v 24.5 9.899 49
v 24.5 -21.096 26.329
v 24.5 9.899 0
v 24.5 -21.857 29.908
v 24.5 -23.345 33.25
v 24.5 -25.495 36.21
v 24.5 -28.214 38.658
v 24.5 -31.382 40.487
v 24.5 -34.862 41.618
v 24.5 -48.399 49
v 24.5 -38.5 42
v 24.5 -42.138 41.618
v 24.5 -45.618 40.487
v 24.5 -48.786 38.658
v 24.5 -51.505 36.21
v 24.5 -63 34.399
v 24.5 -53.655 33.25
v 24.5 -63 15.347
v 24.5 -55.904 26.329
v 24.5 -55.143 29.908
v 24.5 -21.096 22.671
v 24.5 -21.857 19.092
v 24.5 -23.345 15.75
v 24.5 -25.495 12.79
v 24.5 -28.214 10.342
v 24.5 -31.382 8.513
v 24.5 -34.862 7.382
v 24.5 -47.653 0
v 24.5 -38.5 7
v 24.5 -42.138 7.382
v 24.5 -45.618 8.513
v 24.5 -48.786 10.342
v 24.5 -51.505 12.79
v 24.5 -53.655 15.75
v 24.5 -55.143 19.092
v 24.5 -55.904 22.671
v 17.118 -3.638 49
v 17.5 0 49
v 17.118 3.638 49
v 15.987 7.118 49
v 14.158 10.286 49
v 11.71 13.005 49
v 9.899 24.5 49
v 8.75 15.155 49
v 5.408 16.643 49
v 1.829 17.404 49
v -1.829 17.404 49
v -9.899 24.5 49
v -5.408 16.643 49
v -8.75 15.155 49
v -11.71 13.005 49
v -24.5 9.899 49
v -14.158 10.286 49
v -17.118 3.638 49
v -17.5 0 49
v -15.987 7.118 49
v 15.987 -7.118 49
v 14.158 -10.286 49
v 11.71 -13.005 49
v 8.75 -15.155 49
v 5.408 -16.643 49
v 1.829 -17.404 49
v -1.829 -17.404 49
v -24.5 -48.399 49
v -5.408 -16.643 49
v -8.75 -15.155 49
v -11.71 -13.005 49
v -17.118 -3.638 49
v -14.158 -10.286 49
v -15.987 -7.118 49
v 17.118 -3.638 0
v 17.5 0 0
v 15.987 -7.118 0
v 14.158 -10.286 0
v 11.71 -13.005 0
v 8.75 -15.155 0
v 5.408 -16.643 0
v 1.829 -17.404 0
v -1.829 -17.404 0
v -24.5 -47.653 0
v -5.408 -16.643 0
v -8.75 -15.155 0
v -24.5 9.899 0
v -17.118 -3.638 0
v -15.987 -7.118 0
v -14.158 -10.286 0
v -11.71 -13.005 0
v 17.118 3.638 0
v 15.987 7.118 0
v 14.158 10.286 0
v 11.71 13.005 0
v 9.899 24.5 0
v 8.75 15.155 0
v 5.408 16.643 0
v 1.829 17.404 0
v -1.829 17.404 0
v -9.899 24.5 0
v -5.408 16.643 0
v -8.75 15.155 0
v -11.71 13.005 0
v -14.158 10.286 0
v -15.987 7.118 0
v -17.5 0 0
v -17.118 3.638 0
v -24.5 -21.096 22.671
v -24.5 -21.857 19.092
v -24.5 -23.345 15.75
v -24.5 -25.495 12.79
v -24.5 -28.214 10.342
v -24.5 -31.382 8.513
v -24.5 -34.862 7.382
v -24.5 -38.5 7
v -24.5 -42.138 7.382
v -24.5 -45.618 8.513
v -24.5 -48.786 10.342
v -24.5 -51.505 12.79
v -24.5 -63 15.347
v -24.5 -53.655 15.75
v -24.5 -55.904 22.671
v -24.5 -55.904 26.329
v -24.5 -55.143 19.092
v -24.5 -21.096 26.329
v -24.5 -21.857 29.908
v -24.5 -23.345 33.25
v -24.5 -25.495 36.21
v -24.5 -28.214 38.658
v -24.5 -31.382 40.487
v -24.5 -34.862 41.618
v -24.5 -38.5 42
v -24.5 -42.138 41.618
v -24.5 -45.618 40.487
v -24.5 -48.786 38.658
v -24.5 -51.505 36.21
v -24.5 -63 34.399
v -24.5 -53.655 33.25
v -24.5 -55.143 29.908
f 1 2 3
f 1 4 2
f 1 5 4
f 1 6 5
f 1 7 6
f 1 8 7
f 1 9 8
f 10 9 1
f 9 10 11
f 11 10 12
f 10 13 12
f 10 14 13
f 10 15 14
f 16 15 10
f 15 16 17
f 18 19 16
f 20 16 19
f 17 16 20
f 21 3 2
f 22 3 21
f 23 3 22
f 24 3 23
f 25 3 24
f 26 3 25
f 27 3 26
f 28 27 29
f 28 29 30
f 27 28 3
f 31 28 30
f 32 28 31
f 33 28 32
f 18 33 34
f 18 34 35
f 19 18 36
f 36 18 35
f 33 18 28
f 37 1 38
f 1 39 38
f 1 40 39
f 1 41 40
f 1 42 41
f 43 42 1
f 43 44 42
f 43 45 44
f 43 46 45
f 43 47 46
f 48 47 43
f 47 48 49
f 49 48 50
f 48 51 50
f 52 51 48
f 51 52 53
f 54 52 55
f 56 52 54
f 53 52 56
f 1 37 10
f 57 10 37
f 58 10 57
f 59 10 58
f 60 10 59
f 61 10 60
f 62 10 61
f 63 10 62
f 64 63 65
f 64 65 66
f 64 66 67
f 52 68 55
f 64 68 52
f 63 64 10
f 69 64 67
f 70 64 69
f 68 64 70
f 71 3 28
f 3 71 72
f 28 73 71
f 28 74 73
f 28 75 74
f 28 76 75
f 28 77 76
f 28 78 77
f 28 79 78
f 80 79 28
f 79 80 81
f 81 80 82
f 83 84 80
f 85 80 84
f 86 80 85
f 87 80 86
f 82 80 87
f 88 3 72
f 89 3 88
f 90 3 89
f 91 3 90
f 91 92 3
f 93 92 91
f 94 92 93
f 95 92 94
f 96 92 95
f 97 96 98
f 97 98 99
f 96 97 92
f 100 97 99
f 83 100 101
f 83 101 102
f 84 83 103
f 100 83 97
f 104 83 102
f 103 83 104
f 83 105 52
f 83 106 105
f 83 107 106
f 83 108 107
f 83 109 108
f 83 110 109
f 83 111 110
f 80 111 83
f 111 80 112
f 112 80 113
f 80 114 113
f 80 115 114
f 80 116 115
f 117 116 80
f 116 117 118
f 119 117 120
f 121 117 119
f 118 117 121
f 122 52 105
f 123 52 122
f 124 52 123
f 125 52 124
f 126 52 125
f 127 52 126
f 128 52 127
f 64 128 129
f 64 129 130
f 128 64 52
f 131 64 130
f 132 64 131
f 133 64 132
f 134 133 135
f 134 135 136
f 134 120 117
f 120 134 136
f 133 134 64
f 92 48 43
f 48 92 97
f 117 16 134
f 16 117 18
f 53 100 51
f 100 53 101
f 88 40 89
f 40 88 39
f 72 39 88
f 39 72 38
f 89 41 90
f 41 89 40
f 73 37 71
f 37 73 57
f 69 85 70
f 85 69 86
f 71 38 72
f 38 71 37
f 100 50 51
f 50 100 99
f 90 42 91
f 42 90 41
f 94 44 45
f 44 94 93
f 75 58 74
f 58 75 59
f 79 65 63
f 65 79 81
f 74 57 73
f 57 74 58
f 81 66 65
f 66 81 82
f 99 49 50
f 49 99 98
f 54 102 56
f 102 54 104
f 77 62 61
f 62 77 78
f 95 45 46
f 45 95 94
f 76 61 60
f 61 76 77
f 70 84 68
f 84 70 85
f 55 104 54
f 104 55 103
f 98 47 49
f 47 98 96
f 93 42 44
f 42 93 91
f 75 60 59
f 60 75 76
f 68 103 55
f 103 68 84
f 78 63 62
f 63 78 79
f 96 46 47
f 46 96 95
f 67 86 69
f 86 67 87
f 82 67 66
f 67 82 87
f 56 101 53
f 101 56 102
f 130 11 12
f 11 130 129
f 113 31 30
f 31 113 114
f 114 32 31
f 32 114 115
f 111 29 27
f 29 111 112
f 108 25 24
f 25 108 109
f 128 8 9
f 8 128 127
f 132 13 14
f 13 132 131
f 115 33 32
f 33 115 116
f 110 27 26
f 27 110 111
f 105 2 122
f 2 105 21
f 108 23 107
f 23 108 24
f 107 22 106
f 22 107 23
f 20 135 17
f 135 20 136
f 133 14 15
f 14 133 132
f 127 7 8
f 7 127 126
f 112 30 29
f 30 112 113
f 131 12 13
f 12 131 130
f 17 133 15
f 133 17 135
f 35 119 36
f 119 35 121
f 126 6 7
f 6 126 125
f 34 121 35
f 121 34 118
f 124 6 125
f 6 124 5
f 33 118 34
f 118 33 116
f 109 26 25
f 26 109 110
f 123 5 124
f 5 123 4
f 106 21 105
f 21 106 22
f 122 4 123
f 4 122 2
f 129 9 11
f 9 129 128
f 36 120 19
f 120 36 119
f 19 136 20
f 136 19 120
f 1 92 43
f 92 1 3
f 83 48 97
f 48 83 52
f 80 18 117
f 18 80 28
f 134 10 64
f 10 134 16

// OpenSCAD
diameter=35;		
wall_thickness=diameter/5;
thickness_between_tubes=diameter/10;			
width=diameter+2*wall_thickness;
depth=diameter*2+2*wall_thickness+thickness_between_tubes;
height=width;
radius=diameter/2;

difference(){

translate([-(width/2),-(depth-radius-wall_thickness),0])
cube([width,depth,height]);

    cylinder(h=height,r1=radius,r2=radius);

    translate([-(radius+wall_thickness),-(diameter+thickness_between_tubes),radius+wall_thickness])
    rotate([0,90,0])
    cylinder(h=height,r1=radius,r2=radius);
    
    translate([width/2+sqrt(2)*wall_thickness,0,0])
    rotate([0,0,45])
    cube([width,width,height]);
    
    translate([-(width/2)-sqrt(2)*wall_thickness,0,0])
    rotate([0,0,45])
    cube([width, width,height]); 
    
    translate([-(width/2),- depth + height/2-sqrt(2)*wall_thickness,-height+(sqrt(2)*wall_thickness)/2])
    rotate([45,0,0])
    cube([width,height,height]);
   
    translate([-(width/2), -depth + height/2-sqrt(2)*wall_thickness,height/2])  
    rotate([45,0,0])
    cube([width,height,height]);  

    }
